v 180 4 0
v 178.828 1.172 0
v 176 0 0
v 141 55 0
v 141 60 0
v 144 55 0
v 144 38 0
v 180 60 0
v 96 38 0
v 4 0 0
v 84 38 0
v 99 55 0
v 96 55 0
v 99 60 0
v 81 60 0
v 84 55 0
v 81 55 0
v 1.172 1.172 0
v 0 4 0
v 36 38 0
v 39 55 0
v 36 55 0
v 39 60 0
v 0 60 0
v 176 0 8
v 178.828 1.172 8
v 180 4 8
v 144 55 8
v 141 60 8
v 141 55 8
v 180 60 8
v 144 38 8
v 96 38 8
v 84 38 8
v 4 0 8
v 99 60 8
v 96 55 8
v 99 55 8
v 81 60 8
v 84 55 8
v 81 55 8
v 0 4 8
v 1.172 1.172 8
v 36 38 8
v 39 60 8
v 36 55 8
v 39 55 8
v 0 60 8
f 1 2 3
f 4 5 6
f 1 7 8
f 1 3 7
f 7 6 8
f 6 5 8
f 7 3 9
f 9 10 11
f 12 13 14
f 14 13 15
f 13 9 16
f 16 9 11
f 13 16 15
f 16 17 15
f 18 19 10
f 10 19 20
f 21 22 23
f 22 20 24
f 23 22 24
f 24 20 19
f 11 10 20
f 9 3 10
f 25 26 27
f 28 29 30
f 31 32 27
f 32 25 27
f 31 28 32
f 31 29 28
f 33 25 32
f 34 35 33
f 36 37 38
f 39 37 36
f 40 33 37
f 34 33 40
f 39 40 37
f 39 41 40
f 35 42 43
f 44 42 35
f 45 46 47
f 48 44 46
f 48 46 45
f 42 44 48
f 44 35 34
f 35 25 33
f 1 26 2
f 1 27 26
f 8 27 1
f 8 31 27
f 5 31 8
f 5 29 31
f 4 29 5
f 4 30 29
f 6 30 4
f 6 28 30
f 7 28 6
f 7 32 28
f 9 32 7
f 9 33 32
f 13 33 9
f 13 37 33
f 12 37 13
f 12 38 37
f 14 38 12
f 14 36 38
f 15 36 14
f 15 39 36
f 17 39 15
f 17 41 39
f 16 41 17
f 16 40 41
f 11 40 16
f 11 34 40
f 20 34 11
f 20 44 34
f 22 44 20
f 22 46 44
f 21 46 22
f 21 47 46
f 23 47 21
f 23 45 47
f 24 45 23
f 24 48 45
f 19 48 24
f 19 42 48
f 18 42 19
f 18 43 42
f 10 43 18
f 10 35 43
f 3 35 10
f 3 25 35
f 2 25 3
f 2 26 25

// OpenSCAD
$fn = 32;
// ----------------------------------------------------------------------
// Oversize slot bar: 180 mm bar with 2 oversize windows
// ----------------------------------------------------------------------

// --- parameters (mm) ---
profile_height = 8;       // extrusion height
profile_points = 24;      // points of the closed outline

profile = [[0, 4], [1.172, 1.172], [4, 0], [176, 0], [178.828, 1.172], [180, 4], [180, 60], [141, 60], [141, 55], [144, 55], [144, 38], [96, 38], [96, 55], [99, 55], [99, 60], [81, 60], [81, 55], [84, 55], [84, 38], [36, 38], [36, 55], [39, 55], [39, 60], [0, 60]];  // single closed polygon, 24 points, counter clockwise

// --- the one profile operation ---
linear_extrude(height = profile_height) polygon(points = profile);
